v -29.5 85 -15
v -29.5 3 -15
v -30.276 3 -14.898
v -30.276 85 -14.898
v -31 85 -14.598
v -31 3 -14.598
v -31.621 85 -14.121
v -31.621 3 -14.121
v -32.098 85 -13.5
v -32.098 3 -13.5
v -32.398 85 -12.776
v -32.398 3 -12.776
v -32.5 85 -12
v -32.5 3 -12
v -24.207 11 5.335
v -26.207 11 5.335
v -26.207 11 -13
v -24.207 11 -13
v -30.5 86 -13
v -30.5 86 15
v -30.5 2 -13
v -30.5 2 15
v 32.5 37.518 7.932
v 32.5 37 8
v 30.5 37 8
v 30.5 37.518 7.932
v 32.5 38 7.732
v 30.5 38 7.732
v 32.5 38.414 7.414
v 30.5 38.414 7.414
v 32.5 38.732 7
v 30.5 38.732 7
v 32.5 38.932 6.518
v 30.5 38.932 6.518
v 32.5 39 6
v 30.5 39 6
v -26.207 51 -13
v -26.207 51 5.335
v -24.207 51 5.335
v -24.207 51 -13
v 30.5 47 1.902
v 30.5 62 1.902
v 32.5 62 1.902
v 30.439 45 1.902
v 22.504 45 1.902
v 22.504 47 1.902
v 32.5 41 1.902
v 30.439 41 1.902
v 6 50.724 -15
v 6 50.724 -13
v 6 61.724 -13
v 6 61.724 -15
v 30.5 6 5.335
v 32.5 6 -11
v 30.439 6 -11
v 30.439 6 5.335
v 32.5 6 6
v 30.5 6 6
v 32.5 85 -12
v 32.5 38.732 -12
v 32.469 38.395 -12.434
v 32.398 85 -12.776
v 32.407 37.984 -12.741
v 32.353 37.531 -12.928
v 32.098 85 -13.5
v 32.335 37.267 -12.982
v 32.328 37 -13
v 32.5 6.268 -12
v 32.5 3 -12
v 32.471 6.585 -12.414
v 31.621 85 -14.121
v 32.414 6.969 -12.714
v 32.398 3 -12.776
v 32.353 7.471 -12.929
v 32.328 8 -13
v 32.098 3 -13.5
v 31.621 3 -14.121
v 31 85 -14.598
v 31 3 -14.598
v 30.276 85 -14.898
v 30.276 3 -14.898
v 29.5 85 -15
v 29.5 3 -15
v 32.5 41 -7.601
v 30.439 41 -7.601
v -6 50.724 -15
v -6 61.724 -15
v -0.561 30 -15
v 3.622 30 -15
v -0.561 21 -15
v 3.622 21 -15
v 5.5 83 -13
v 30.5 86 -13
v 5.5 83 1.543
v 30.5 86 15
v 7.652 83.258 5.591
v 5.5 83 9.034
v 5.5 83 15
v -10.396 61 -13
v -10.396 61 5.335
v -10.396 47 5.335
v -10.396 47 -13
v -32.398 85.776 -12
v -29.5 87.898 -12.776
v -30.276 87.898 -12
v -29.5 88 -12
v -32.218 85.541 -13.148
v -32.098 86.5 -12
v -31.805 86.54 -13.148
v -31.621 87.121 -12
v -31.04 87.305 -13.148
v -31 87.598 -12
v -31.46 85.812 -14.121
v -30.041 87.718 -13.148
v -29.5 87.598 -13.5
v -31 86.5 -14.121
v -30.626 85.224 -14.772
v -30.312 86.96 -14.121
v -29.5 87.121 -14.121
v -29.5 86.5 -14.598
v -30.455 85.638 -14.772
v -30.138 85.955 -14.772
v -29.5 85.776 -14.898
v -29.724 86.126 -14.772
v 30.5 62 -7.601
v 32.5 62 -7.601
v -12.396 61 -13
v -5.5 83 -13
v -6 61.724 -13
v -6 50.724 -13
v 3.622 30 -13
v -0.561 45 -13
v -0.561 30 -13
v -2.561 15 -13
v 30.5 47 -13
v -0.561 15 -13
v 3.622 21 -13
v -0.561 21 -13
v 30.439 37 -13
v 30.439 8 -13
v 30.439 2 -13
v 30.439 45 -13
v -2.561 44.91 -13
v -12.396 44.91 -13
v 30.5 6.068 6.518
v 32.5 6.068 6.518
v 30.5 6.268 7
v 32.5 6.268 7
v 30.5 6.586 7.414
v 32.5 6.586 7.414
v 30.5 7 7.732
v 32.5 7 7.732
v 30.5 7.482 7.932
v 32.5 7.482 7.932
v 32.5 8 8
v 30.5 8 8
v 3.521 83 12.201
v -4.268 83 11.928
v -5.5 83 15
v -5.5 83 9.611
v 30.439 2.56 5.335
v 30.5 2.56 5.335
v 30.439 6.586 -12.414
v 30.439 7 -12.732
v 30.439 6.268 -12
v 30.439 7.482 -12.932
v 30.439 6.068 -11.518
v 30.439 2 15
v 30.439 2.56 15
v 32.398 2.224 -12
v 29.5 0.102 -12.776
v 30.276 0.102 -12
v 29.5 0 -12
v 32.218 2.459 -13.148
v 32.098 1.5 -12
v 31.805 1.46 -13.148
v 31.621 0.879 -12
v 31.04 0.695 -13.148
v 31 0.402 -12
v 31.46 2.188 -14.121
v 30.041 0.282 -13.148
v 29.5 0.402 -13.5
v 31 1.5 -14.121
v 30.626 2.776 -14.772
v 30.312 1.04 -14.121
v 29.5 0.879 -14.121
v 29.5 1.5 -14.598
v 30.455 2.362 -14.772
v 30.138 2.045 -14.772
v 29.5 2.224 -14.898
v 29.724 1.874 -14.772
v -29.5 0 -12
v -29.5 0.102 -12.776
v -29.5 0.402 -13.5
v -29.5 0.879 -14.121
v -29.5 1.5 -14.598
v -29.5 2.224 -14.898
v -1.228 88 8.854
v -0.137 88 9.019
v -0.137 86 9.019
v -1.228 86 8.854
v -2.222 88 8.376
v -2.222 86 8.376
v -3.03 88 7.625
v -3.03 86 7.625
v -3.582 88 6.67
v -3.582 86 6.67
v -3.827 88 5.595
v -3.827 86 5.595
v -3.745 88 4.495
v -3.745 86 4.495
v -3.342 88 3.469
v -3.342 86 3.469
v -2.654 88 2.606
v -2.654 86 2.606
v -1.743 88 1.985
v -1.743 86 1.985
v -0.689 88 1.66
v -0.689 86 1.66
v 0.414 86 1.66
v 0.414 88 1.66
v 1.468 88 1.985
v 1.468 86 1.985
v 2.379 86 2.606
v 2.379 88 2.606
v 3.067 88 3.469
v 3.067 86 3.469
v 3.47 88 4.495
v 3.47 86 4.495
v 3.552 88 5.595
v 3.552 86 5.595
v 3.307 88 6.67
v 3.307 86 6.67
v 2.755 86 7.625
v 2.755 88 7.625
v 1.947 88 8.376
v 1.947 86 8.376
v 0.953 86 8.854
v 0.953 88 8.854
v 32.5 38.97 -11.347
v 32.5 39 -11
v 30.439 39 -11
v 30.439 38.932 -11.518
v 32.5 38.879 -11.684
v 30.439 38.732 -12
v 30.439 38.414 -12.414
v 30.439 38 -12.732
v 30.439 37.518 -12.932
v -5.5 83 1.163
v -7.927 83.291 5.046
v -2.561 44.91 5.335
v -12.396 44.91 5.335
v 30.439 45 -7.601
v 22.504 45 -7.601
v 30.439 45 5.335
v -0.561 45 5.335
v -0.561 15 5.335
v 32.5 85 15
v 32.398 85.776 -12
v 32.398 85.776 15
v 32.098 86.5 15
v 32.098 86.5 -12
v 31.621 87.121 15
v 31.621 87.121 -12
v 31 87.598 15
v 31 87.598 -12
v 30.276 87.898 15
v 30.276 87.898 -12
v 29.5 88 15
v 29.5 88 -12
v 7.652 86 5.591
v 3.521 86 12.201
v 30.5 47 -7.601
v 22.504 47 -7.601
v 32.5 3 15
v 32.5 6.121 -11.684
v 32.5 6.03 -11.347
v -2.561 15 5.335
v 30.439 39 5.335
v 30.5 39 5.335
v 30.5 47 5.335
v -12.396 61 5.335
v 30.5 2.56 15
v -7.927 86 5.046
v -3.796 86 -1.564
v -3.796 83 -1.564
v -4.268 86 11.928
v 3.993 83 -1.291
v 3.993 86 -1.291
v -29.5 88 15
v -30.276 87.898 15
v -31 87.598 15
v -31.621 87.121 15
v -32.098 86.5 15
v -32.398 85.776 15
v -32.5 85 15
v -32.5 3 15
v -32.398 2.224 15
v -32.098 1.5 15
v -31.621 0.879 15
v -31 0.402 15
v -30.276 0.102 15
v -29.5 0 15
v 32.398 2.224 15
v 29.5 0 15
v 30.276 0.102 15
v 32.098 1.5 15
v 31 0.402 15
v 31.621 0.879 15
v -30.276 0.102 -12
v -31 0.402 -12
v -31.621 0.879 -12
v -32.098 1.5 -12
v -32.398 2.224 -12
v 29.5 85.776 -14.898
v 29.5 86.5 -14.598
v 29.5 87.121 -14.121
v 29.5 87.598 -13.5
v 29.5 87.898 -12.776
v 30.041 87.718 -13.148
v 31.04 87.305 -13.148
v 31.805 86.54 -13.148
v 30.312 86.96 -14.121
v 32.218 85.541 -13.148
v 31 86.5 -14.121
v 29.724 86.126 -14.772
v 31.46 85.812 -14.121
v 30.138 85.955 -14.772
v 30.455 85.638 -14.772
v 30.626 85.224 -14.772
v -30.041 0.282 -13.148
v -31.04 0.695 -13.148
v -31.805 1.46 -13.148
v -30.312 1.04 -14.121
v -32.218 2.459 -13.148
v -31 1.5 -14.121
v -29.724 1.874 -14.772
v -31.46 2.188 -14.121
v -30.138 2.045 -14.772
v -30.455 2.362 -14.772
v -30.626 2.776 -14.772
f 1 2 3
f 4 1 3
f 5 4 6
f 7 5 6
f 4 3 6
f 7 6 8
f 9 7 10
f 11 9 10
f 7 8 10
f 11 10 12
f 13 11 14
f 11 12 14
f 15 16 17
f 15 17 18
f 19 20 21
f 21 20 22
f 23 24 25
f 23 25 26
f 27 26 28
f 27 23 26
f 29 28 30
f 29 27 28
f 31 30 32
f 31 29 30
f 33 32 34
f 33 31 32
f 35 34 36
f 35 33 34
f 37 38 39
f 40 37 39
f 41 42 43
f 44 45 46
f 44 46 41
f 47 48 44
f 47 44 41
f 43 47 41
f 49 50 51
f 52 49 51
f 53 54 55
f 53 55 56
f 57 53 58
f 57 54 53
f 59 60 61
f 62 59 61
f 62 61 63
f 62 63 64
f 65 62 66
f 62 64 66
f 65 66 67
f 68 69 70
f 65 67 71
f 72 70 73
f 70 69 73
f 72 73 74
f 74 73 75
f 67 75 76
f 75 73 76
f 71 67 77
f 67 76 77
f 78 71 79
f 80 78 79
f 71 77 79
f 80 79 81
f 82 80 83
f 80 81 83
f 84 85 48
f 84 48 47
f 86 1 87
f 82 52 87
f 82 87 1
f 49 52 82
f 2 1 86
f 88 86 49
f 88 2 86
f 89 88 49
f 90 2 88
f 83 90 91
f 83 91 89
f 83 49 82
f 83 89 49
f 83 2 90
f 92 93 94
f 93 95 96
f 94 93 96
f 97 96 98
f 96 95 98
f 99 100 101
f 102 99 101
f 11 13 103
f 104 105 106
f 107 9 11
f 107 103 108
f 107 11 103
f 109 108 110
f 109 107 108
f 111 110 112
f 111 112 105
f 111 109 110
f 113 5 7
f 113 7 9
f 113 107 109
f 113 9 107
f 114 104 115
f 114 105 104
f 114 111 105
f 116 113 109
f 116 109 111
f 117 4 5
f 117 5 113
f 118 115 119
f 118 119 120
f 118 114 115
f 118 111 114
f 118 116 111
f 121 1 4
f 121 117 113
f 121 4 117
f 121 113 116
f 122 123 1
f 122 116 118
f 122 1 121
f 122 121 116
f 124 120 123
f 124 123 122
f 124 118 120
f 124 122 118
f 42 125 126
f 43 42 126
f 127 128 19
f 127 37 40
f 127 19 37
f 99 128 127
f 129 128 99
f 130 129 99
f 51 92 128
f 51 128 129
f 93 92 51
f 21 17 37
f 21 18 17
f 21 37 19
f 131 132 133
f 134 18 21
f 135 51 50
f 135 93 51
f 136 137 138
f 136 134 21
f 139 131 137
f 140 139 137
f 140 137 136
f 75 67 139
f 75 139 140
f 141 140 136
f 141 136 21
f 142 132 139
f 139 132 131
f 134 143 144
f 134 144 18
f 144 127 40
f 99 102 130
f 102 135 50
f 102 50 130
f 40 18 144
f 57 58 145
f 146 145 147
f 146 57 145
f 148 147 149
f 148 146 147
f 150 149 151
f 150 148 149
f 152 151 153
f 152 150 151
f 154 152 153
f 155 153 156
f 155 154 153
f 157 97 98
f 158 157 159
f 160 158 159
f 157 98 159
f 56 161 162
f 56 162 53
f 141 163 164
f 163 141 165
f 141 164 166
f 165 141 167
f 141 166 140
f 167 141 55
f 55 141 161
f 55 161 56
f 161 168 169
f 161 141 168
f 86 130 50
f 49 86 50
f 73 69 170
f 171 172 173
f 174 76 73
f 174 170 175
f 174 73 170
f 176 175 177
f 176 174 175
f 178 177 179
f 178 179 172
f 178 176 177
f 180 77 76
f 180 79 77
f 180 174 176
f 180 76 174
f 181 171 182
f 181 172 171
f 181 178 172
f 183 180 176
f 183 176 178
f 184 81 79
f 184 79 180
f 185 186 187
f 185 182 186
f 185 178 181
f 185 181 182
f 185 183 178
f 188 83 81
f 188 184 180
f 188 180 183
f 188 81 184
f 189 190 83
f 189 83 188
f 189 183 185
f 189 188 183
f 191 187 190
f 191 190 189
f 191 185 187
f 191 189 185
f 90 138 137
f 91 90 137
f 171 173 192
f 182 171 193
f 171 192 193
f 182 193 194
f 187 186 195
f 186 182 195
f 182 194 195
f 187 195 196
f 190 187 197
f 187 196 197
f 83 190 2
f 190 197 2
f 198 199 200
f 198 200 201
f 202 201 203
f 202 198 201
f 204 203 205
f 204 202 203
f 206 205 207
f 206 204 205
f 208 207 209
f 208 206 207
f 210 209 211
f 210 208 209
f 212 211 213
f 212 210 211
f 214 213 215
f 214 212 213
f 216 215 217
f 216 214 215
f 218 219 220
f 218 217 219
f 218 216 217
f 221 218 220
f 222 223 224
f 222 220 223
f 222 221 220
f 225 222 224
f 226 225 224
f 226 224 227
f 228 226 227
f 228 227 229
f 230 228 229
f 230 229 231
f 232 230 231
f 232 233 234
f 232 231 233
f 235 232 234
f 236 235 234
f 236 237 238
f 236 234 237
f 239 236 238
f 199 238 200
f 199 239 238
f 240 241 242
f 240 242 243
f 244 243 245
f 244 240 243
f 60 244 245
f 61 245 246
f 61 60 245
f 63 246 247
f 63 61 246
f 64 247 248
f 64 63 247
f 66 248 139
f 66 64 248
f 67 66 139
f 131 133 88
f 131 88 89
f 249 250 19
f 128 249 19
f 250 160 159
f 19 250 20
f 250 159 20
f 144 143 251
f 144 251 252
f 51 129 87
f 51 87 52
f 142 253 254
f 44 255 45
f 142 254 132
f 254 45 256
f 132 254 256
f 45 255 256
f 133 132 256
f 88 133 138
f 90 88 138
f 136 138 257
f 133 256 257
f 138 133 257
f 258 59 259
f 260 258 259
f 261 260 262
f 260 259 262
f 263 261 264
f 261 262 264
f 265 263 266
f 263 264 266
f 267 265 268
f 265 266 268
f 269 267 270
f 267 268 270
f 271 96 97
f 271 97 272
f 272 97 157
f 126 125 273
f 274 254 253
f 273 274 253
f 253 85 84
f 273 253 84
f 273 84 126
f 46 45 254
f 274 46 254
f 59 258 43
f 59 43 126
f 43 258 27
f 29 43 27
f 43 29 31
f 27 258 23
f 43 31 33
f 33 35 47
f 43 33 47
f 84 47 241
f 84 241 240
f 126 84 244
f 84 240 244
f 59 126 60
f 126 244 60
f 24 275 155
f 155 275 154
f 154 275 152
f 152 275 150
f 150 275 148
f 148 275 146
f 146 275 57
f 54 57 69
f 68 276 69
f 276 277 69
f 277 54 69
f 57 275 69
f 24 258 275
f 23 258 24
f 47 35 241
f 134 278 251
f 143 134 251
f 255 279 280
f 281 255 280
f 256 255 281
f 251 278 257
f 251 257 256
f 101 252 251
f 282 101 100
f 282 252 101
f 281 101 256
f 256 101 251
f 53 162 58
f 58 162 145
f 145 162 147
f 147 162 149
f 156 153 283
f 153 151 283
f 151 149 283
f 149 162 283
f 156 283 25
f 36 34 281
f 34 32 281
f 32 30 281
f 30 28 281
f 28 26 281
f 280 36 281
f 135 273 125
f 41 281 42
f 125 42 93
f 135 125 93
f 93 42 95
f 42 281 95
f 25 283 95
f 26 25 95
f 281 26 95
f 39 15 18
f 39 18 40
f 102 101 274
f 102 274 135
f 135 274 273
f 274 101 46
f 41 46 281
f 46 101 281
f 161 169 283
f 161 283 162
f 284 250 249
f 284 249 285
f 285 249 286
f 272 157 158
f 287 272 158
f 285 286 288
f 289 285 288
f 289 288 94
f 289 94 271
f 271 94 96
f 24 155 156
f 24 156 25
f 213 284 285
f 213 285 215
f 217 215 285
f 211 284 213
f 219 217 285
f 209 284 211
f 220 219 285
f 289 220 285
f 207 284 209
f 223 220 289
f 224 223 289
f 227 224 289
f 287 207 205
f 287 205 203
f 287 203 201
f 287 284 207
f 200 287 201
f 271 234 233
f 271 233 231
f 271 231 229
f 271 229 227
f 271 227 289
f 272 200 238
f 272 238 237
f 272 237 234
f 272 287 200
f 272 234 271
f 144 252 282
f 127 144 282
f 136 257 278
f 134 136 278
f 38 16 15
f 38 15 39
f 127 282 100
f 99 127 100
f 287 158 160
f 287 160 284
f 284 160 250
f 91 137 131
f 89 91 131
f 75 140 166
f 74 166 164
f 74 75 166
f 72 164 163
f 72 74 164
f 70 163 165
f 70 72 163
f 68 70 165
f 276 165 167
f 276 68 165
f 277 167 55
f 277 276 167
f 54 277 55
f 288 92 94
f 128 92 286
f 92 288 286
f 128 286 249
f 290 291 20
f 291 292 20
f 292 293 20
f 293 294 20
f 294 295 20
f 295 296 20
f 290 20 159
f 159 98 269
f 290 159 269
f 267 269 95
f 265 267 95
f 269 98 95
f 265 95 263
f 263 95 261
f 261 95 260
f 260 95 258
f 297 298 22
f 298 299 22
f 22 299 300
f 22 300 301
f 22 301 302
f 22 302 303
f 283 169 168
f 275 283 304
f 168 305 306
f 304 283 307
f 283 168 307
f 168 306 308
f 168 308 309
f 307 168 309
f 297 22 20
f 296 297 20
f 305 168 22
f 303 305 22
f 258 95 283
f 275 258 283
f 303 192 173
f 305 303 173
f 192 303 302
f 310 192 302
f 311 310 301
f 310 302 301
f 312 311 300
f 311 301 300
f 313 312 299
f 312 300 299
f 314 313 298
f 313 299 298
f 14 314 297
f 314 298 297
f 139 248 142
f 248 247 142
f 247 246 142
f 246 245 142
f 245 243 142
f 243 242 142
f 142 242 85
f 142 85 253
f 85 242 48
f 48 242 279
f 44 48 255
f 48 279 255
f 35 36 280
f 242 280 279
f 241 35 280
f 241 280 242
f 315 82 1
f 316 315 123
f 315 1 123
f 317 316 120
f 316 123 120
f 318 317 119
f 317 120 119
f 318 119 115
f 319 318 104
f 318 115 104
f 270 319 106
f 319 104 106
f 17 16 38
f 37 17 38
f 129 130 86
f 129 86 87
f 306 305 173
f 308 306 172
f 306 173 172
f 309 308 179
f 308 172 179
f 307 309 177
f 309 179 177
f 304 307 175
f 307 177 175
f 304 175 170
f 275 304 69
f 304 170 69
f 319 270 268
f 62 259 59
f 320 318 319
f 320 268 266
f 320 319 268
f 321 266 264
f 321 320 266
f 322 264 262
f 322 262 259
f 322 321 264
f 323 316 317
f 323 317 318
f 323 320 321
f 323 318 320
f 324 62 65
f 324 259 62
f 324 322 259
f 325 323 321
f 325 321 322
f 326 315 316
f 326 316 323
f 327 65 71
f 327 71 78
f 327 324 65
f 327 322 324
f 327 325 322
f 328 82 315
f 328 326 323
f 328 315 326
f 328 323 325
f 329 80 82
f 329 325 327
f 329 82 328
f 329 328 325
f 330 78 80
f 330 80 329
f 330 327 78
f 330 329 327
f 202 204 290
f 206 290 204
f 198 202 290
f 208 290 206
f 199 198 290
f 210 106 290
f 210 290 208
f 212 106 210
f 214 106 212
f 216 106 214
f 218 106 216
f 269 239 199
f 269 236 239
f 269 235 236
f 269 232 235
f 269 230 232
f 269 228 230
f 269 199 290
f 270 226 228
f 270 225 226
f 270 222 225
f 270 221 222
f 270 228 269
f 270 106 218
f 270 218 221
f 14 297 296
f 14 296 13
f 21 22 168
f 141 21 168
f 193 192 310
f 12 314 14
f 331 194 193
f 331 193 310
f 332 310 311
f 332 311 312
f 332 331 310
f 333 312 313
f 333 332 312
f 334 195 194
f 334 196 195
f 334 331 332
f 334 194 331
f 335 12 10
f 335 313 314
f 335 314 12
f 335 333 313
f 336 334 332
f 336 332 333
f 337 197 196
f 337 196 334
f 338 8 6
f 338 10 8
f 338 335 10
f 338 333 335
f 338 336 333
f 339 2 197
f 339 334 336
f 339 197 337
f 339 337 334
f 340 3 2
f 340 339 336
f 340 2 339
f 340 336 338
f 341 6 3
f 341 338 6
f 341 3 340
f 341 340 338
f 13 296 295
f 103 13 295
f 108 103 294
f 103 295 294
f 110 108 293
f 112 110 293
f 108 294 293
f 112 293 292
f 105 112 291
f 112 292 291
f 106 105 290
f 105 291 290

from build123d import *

# Parameters (mm, degrees)
SKETCH_1_W               = 65
SKETCH_1_H               = 30
EXTRUDE_1_DEPTH          = 88
SKETCH_4_W               = 2
SKETCH_4_H               = 40
CUT_EXTRUDE_1_DEPTH      = 28
CUT_EXTRUDE_2_DEPTH      = 6
SKETCH_7_W               = 4.182275868
SKETCH_7_H               = 9
CUT_EXTRUDE_3_DEPTH      = 6
SKETCH_8_W               = 12
SKETCH_8_H               = 11
CUT_EXTRUDE_4_DEPTH      = 6
FILLET_1_R               = 3
CUT_EXTRUDE_5_DEPTH      = 3
CUT_EXTRUDE_6_DEPTH      = 15
CUT_EXTRUDE_6_DEPTH_BACK = 6
SKETCH_12_W              = 10
SKETCH_12_H              = 9.5034376
CUT_EXTRUDE_8_DEPTH      = 5
CUT_EXTRUDE_8_DEPTH_BACK = 10
SKETCH_18_R              = 3.7
SKETCH_19_W              = 9.664954626
SKETCH_19_H              = 76.096771223
CUT_EXTRUDE_9_DEPTH      = 61


with BuildPart() as part:
    # 草图1 → 凸台-拉伸1 (new body)
    with BuildSketch(Plane(origin=(0, 0, 0), x_dir=(1, 0, 0), z_dir=(0, 1, 0))):
        Rectangle(SKETCH_1_W, SKETCH_1_H)
    extrude(amount=EXTRUDE_1_DEPTH)

    # 草图4 → 切除-拉伸1 (cut)
    with BuildSketch(Plane.XY.offset(15)):
        Polygon((-30.5, 86), (-30.5, 2), (-18.5, 2), (-9.5, 2), (30.439417497, 2), (30.439417497, 45), (-0.560582503, 45), (-0.560582503, 15), (-2.560582503, 15), (-2.560582503, 44.909852699), (-12.396150881, 44.909852699), (-12.396150881, 61), (-10.396150881, 61), (-10.396150881, 47), (24.5, 47), (30.5, 47), (30.5, 48.635726891), (30.5, 59.903593532), (30.5, 86), (5.5, 83), (-5.5, 83), align=None)
        with Locations((-25.206585503, 31)):
            Rectangle(SKETCH_4_W, SKETCH_4_H, mode=Mode.SUBTRACT)
    extrude(amount=-CUT_EXTRUDE_1_DEPTH, mode=Mode.SUBTRACT)

    # 草图6 → 切除-拉伸2 (cut)
    with BuildSketch(Plane(origin=(32.5, 0, 0), x_dir=(0, 0, -1), z_dir=(1, 0, 0))):
        with BuildLine():
            Line((13, 37), (13, 8))
            ThreePointArc((13, 8), (12.414213562, 6.585786438), (11, 6))
            Line((11, 6), (-6, 6))
            ThreePointArc((-6, 6), (-7.414213562, 6.585786438), (-8, 8))
            Line((-8, 8), (-8, 37))
            ThreePointArc((-8, 37), (-7.414213562, 38.414213562), (-6, 39))
            Line((-6, 39), (11, 39))
            ThreePointArc((11, 39), (12.414213562, 38.414213562), (13, 37))
        make_face()
    extrude(amount=-CUT_EXTRUDE_2_DEPTH, mode=Mode.SUBTRACT)

    # 草图7 → 切除-拉伸3 (cut)
    with BuildSketch(Plane.XY.offset(-13)):
        with Locations((1.530555431, 25.5)):
            Rectangle(SKETCH_7_W, SKETCH_7_H)
    extrude(amount=-CUT_EXTRUDE_3_DEPTH, mode=Mode.SUBTRACT)

    # 草图8 → 切除-拉伸4 (cut)
    with BuildSketch(Plane.XY.offset(-13)):
        with Locations((0, 56.224480757)):
            Rectangle(SKETCH_8_W, SKETCH_8_H)
    extrude(amount=-CUT_EXTRUDE_4_DEPTH, mode=Mode.SUBTRACT)

    # 圆角1
    # the kernel refuses this fillet: 3 mm, written as the material it takes off along each edge
    with BuildSketch(Plane(origin=(29.5, 3, -12), x_dir=(0, -1, 0), z_dir=(0, 0, -1))) as fillet_1_piece_1_section:
        Polygon((0, 0), (FILLET_1_R, 0), (FILLET_1_R, -FILLET_1_R), (0, -FILLET_1_R), align=None)
    fillet_1_piece_1 = extrude(amount=FILLET_1_R, mode=Mode.PRIVATE)
    fillet_1_piece_1 = fillet_1_piece_1 - Plane(origin=(29.5, 3, -12), x_dir=(-0.7071067811865475, 0.7071067811865475, 0), z_dir=(0, 0, -1)) * Sphere(FILLET_1_R, mode=Mode.PRIVATE)
    add(fillet_1_piece_1, mode=Mode.SUBTRACT)
    with BuildSketch(Plane(origin=(29.5, 85, -12), x_dir=(0, 1, 0), z_dir=(0, 0, -1))) as fillet_1_piece_2_section:
        Polygon((0, 0), (FILLET_1_R, 0), (FILLET_1_R, FILLET_1_R), (0, FILLET_1_R), align=None)
    fillet_1_piece_2 = extrude(amount=FILLET_1_R, mode=Mode.PRIVATE)
    fillet_1_piece_2 = fillet_1_piece_2 - Plane(origin=(29.5, 85, -12), x_dir=(-0.7071067811865475, -0.7071067811865475, 0), z_dir=(0, 0, -1)) * Sphere(FILLET_1_R, mode=Mode.PRIVATE)
    add(fillet_1_piece_2, mode=Mode.SUBTRACT)
    with BuildSketch(Plane(origin=(-29.5, 3, -12), x_dir=(-1, 0, 0), z_dir=(0, 0, -1))) as fillet_1_piece_3_section:
        Polygon((0, 0), (FILLET_1_R, 0), (FILLET_1_R, -FILLET_1_R), (0, -FILLET_1_R), align=None)
    fillet_1_piece_3 = extrude(amount=FILLET_1_R, mode=Mode.PRIVATE)
    fillet_1_piece_3 = fillet_1_piece_3 - Plane(origin=(-29.5, 3, -12), x_dir=(0.7071067811865475, 0.7071067811865475, 0), z_dir=(0, 0, -1)) * Sphere(FILLET_1_R, mode=Mode.PRIVATE)
    add(fillet_1_piece_3, mode=Mode.SUBTRACT)
    with BuildSketch(Plane(origin=(-29.5, 85, -12), x_dir=(-1, 0, 0), z_dir=(0, 0, -1))) as fillet_1_piece_4_section:
        Polygon((0, 0), (FILLET_1_R, 0), (FILLET_1_R, FILLET_1_R), (0, FILLET_1_R), align=None)
    fillet_1_piece_4 = extrude(amount=FILLET_1_R, mode=Mode.PRIVATE)
    fillet_1_piece_4 = fillet_1_piece_4 - Plane(origin=(-29.5, 85, -12), x_dir=(0.7071067811865475, -0.7071067811865475, 0), z_dir=(0, 0, -1)) * Sphere(FILLET_1_R, mode=Mode.PRIVATE)
    add(fillet_1_piece_4, mode=Mode.SUBTRACT)
    with BuildSketch(Plane(origin=(32.5, 3, -15), x_dir=(-1, 0, 0), z_dir=(0, 1, 0))) as fillet_1_piece_5:
        with BuildLine():
            CenterArc((FILLET_1_R, FILLET_1_R), FILLET_1_R, 180, 90)
            Line((0, FILLET_1_R), (0, 0))
            Line((0, 0), (FILLET_1_R, 0))
        make_face()
    extrude(amount=82, mode=Mode.SUBTRACT)
    with BuildSketch(Plane(origin=(-32.5, 3, -15), x_dir=(1, 0, 0), z_dir=(0, 1, 0))) as fillet_1_piece_6:
        with BuildLine():
            CenterArc((FILLET_1_R, -FILLET_1_R), FILLET_1_R, 90, 90)
            Line((0, -FILLET_1_R), (0, 0))
            Line((0, 0), (FILLET_1_R, 0))
        make_face()
    extrude(amount=82, mode=Mode.SUBTRACT)
    with BuildSketch(Plane(origin=(-32.5, 0, 22.5), x_dir=(0, 1, 0), z_dir=(0, 0, -1)), Plane(origin=(32.5, 88, -12), x_dir=(-1, 0, 0), z_dir=(0, 0, 1))) as fillet_1_piece_7:
        with BuildLine():
            CenterArc((FILLET_1_R, FILLET_1_R), FILLET_1_R, 180, 90)
            Line((0, FILLET_1_R), (0, 0))
            Line((0, 0), (FILLET_1_R, 0))
        make_face()
    extrude(amount=34.5, mode=Mode.SUBTRACT)
    with BuildSketch(Plane(origin=(32.5, 0, -12), x_dir=(-1, 0, 0), z_dir=(0, 0, 1)), Plane(origin=(-32.5, 88, 22.5), x_dir=(0, -1, 0), z_dir=(0, 0, -1))) as fillet_1_piece_8:
        with BuildLine():
            CenterArc((FILLET_1_R, -FILLET_1_R), FILLET_1_R, 90, 90)
            Line((0, -FILLET_1_R), (0, 0))
            Line((0, 0), (FILLET_1_R, 0))
        make_face()
    extrude(amount=34.5, mode=Mode.SUBTRACT)
    with BuildSketch(Plane(origin=(-29.5, 0, -15), x_dir=(0, 1, 0), z_dir=(1, 0, 0))) as fillet_1_piece_9:
        with BuildLine():
            CenterArc((FILLET_1_R, FILLET_1_R), FILLET_1_R, 180, 90)
            Line((0, FILLET_1_R), (0, 0))
            Line((0, 0), (FILLET_1_R, 0))
        make_face()
    extrude(amount=59, mode=Mode.SUBTRACT)
    with BuildSketch(Plane(origin=(-29.5, 88, -15), x_dir=(0, -1, 0), z_dir=(1, 0, 0))) as fillet_1_piece_10:
        with BuildLine():
            CenterArc((FILLET_1_R, -FILLET_1_R), FILLET_1_R, 90, 90)
            Line((0, -FILLET_1_R), (0, 0))
            Line((0, 0), (FILLET_1_R, 0))
        make_face()
    extrude(amount=59, mode=Mode.SUBTRACT)

    # 草图10 → 切除-拉伸5 (cut)
    with BuildSketch(Plane.XZ.offset(-83)):
        Polygon((3.993436667, -1.290973026), (7.651958762, 5.591266151), (3.521025848, 12.200758813), (-4.268429161, 11.9280123), (-7.926951256, 5.045773123), (-3.796018342, -1.563719539), align=None)
    extrude(amount=-CUT_EXTRUDE_5_DEPTH, mode=Mode.SUBTRACT)

    # 草图12 → 切除-拉伸6 (cut, two sides: drawn at the far end of the back side and taken through both)
    with BuildSketch(Plane(origin=(0, 47, 0), x_dir=(1, 0, 0), z_dir=(0, 1, 0)).offset(-CUT_EXTRUDE_6_DEPTH_BACK)):
        with Locations((27.504184345, 2.8493686)):
            Rectangle(SKETCH_12_W, SKETCH_12_H)
    extrude(amount=CUT_EXTRUDE_6_DEPTH + CUT_EXTRUDE_6_DEPTH_BACK, mode=Mode.SUBTRACT)

    # 草图18 → 切除-拉伸8 (cut, two sides: drawn at the far end of the back side and taken through both)
    with BuildSketch(Plane.XZ.offset(-83).offset(-CUT_EXTRUDE_8_DEPTH_BACK)):
        with Locations(Location((-0.137496247, 5.318519637, 0), (0, 0, 90))):
            Circle(SKETCH_18_R)
    extrude(amount=CUT_EXTRUDE_8_DEPTH + CUT_EXTRUDE_8_DEPTH_BACK, mode=Mode.SUBTRACT)

    # 草图19 → 切除-拉伸9 (cut)
    with BuildSketch(Plane(origin=(-30.5, 0, 0), x_dir=(0, 0, -1), z_dir=(1, 0, 0))):
        with Locations((-10.167522687, 40.608730848)):
            Rectangle(SKETCH_19_W, SKETCH_19_H)
    extrude(amount=CUT_EXTRUDE_9_DEPTH, mode=Mode.SUBTRACT)


solid = part.part
